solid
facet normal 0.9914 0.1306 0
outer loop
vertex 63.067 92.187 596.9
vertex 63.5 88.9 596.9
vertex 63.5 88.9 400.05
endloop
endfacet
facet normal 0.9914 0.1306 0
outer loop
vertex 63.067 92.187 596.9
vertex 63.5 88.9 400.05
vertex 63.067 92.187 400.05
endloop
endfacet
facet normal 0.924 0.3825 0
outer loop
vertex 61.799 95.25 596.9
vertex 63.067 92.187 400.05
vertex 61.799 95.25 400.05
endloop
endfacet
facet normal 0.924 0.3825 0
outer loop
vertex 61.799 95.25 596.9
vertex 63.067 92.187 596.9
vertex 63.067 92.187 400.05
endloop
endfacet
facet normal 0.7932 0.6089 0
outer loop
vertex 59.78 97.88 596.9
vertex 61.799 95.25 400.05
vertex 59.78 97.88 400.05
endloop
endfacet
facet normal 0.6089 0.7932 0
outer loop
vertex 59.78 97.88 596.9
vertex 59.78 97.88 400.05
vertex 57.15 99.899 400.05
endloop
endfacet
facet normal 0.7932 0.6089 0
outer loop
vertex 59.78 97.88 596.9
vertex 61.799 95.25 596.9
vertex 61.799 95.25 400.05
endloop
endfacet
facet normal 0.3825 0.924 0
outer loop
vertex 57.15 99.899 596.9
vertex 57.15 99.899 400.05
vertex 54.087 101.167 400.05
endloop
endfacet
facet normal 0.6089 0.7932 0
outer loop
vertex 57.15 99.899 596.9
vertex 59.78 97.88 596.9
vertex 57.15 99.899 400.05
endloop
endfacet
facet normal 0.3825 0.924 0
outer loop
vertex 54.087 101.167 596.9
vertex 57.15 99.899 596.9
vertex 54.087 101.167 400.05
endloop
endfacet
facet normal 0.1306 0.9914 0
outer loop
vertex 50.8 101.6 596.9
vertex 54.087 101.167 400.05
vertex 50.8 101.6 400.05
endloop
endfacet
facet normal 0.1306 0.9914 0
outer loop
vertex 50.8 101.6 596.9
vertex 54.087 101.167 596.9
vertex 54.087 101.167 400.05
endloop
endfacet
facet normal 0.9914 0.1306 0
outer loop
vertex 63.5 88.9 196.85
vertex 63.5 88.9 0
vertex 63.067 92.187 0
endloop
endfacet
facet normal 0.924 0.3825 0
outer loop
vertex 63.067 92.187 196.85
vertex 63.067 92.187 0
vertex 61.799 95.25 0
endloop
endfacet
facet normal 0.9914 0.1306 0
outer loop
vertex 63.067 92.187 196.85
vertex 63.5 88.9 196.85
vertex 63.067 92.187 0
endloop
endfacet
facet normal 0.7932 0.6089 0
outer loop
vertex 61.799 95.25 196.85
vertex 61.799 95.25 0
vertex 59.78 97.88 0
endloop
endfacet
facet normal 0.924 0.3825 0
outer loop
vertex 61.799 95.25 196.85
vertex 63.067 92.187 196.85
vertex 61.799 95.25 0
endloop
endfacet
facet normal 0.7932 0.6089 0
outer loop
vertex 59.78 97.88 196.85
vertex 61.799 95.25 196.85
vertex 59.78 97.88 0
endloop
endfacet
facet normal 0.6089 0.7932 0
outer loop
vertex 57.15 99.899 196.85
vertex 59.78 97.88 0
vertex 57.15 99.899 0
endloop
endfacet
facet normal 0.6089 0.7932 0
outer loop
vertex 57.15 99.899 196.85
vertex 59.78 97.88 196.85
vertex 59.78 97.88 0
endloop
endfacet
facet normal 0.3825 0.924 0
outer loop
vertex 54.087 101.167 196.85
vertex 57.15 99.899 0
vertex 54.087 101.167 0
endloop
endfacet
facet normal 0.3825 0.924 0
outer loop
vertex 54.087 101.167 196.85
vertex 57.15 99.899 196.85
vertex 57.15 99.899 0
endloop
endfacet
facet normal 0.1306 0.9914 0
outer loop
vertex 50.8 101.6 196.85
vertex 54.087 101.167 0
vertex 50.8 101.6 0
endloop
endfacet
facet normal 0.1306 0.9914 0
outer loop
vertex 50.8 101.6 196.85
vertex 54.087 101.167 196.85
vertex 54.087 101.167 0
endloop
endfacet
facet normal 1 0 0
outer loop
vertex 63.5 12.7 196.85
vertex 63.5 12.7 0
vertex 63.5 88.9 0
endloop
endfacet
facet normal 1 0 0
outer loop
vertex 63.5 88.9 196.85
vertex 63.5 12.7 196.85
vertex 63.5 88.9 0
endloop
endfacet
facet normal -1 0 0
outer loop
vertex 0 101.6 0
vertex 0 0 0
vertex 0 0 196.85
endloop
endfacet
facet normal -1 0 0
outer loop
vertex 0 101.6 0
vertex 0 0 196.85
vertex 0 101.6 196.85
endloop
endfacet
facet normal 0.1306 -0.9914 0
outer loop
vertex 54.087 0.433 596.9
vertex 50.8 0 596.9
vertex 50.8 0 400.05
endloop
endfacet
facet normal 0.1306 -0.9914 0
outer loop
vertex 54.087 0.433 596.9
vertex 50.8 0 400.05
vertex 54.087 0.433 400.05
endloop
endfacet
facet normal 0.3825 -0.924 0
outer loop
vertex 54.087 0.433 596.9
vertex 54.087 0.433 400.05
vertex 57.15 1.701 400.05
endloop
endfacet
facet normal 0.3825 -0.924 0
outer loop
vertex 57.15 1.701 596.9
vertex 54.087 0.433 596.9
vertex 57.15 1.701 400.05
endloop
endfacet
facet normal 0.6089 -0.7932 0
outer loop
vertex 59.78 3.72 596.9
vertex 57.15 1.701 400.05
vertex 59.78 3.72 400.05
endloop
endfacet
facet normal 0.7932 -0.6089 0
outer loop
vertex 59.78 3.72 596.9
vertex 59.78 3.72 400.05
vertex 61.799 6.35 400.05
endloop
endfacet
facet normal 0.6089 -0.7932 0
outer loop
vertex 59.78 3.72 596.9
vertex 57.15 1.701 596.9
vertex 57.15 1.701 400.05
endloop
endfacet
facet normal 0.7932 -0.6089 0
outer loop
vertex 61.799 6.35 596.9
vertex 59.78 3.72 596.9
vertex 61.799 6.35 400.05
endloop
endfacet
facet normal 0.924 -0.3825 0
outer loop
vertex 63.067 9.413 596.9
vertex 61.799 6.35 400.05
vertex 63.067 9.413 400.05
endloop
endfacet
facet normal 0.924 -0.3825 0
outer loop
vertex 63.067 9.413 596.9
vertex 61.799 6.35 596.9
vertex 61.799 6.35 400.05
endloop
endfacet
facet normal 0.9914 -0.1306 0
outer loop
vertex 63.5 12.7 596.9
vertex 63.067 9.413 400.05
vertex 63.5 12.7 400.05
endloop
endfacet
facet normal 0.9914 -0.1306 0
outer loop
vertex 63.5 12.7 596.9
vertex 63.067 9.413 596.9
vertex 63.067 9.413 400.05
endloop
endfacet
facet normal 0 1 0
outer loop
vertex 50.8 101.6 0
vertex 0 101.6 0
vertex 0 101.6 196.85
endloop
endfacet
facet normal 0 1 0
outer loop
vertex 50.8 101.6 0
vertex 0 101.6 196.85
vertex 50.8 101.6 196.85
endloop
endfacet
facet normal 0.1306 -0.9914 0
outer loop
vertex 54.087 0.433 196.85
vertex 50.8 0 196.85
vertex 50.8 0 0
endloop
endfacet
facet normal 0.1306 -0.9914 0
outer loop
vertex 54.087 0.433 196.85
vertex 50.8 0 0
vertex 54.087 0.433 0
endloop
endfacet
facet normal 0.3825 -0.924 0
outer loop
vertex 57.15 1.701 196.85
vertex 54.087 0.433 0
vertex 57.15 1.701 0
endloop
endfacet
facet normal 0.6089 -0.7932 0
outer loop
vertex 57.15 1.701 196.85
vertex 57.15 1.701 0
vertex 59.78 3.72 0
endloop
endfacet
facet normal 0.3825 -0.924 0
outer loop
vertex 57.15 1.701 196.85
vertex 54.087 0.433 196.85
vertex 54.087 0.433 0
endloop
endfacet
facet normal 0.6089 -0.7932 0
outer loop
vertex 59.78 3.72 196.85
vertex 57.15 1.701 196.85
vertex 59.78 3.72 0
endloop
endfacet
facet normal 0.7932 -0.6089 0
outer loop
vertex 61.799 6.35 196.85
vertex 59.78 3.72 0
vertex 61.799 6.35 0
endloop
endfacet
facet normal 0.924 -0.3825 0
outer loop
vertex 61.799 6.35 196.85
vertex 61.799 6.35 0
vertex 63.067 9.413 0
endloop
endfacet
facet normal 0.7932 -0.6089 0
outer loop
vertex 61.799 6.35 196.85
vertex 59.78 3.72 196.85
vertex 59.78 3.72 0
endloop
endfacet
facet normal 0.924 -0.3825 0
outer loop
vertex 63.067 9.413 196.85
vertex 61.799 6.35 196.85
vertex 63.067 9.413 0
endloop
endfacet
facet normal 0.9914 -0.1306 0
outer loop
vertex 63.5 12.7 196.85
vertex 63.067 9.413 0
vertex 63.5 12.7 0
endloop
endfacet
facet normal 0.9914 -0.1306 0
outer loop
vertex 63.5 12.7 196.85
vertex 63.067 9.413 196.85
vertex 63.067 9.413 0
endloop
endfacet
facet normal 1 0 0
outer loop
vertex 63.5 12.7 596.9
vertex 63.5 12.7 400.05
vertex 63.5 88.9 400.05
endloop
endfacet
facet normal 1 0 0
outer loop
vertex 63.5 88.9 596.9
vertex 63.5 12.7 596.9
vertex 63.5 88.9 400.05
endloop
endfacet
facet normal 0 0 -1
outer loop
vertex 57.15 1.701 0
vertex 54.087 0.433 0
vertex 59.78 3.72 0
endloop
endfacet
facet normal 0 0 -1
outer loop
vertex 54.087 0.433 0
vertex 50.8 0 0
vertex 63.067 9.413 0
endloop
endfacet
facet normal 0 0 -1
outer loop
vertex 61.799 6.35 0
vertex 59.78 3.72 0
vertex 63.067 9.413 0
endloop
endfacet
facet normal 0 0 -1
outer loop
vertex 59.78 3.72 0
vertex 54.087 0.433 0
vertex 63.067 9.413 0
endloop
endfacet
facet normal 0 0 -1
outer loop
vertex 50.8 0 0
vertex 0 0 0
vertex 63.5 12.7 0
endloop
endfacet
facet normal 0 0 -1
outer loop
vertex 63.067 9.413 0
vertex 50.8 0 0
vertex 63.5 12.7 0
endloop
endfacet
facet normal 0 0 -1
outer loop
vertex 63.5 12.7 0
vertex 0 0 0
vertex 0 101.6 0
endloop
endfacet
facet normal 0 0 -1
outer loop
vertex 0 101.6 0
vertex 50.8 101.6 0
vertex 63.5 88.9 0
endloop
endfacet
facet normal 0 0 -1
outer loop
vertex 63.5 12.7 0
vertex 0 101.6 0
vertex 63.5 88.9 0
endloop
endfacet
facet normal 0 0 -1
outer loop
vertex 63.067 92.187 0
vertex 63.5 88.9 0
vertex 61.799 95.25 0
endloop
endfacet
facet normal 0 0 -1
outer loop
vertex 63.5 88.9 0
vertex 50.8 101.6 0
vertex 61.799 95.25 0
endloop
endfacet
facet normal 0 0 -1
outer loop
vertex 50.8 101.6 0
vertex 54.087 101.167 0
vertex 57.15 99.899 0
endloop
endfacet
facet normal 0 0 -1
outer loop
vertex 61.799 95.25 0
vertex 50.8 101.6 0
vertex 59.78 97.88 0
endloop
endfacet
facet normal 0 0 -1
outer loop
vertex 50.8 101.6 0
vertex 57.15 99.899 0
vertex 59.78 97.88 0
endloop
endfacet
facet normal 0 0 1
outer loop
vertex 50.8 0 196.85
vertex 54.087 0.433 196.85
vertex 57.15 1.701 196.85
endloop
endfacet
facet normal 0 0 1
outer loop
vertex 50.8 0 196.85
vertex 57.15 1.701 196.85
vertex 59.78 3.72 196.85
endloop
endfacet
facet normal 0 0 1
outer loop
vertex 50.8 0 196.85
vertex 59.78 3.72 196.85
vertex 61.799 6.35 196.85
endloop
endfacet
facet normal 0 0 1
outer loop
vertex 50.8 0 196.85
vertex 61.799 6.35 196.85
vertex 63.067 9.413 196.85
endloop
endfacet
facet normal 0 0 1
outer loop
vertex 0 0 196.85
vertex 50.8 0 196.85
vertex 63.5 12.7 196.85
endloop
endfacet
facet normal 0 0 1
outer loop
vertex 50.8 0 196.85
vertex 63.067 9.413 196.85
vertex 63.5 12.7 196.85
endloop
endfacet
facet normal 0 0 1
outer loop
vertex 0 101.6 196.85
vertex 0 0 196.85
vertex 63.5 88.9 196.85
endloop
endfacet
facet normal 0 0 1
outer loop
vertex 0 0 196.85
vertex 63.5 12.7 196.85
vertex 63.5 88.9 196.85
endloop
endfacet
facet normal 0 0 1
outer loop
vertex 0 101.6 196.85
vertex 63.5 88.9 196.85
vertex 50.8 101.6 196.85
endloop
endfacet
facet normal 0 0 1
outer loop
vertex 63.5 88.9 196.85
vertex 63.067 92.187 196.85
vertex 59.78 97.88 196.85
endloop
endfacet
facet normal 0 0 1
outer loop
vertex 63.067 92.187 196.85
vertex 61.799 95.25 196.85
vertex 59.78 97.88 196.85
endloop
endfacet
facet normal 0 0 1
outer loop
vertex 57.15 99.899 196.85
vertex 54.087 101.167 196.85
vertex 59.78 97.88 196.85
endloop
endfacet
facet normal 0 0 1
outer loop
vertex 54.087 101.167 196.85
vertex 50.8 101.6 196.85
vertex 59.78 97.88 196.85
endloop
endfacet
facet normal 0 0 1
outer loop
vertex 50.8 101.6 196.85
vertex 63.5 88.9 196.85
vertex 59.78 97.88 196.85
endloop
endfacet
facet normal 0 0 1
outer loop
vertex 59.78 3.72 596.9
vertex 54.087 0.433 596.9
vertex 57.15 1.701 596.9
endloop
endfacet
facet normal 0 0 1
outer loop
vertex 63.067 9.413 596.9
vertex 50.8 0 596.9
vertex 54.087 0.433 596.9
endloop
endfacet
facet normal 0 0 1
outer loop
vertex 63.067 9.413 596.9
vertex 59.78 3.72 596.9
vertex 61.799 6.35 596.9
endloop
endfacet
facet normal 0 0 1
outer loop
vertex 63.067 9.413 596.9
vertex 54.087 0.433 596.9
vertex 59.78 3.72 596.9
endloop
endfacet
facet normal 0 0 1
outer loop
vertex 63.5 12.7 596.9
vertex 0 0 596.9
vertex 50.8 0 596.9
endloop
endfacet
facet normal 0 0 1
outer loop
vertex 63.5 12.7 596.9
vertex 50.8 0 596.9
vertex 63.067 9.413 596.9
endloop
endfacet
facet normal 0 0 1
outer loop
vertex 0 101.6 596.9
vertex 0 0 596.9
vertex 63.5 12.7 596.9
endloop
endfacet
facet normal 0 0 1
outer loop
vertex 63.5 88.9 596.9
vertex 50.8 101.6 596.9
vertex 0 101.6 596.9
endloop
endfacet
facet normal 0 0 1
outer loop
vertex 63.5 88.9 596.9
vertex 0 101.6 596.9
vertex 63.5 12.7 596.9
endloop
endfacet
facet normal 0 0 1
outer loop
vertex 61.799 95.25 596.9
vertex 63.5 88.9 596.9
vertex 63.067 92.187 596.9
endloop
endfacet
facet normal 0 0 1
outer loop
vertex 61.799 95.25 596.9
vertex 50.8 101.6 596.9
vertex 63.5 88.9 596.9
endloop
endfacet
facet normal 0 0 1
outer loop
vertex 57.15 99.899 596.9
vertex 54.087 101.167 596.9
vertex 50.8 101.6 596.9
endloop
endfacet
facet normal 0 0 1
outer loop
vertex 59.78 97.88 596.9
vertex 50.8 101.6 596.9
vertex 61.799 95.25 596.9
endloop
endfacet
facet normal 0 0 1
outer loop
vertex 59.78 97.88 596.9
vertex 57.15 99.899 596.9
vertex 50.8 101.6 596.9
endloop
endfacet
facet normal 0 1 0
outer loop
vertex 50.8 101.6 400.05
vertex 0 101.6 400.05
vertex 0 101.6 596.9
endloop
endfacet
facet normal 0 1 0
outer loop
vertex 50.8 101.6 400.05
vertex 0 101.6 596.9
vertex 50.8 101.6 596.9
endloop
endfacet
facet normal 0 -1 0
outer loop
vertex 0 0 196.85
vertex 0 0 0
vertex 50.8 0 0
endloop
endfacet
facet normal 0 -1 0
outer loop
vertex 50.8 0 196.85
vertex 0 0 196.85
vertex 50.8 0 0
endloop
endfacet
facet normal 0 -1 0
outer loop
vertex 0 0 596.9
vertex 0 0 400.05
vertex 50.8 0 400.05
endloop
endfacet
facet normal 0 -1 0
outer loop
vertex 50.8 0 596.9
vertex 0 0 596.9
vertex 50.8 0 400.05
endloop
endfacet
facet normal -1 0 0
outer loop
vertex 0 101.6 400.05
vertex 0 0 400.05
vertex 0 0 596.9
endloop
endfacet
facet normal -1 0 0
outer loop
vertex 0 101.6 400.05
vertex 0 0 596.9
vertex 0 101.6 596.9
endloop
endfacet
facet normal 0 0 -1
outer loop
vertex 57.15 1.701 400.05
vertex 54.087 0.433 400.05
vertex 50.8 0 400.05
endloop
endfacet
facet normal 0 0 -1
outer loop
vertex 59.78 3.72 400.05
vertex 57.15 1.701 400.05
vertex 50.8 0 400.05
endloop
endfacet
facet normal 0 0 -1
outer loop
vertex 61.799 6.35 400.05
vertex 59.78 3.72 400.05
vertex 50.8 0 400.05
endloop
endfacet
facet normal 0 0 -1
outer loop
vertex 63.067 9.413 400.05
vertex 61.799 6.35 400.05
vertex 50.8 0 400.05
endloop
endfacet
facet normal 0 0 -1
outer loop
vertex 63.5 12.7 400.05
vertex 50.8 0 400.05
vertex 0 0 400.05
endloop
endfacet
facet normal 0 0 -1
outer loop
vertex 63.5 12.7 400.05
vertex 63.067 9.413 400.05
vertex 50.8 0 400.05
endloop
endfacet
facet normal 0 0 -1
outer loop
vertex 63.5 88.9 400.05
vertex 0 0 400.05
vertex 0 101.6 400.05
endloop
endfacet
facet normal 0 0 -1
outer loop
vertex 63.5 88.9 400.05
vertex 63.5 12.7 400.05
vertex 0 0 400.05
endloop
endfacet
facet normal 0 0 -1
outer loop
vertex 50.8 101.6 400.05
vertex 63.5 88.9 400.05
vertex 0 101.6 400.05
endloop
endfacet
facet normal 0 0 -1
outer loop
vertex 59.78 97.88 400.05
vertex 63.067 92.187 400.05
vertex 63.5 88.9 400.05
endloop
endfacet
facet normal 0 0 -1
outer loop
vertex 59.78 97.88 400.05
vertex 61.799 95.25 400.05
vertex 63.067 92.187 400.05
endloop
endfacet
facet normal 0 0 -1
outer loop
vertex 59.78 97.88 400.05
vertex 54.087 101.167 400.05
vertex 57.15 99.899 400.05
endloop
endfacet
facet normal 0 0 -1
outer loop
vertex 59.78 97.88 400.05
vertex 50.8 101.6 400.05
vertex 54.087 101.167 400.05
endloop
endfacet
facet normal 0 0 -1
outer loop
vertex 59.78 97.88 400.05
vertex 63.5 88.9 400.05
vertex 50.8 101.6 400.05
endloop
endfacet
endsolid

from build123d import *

# Parameters (mm, degrees)
SKETCH1_W           = 63.5
SKETCH1_H           = 101.6
BOSS_EXTRUDE1_DEPTH = 596.9
FILLET1_R           = 12.7
SKETCH2_W           = 203.2
SKETCH2_H           = 101.6
CUT_EXTRUDE1_DEPTH  = 609.805732562


with BuildPart() as part:
    # Sketch1 → Boss-Extrude1 (new body)
    with BuildSketch(Plane.XY):
        with Locations((31.75, 50.8)):
            Rectangle(SKETCH1_W, SKETCH1_H)
    extrude(amount=BOSS_EXTRUDE1_DEPTH)

    # Fillet1
    fillet1_edges = [part.edges().sort_by_distance(p)[0] for p in [
        (63.5, 101.6, 298.45),
        (63.5, 0, 298.45),
    ]]
    fillet(fillet1_edges, radius=FILLET1_R)

    # Sketch2 → Cut-Extrude1 (cut, through all)
    with BuildSketch(Plane(origin=(63.5, 0, 0), x_dir=(0, 0, -1), z_dir=(1, 0, 0))):
        with Locations((-298.45, 50.8)):
            Rectangle(SKETCH2_W, SKETCH2_H)
    extrude(amount=-CUT_EXTRUDE1_DEPTH, mode=Mode.SUBTRACT)


with BuildPart() as cut_extrude1_piece_1:
    # of the separate pieces the step leaves, piece 1, a body of its own (cut_extrude1_pieces)
    add(part.part.solids().sort_by_distance((50.8, 101.6, 400.05))[0])


with BuildPart() as cut_extrude1_piece_2:
    # of the separate pieces the step leaves, piece 2, a body of its own (cut_extrude1_pieces)
    add(part.part.solids().sort_by_distance((50.8, 101.6, 0))[0])


solid = Compound([cut_extrude1_piece_1.part, cut_extrude1_piece_2.part])
